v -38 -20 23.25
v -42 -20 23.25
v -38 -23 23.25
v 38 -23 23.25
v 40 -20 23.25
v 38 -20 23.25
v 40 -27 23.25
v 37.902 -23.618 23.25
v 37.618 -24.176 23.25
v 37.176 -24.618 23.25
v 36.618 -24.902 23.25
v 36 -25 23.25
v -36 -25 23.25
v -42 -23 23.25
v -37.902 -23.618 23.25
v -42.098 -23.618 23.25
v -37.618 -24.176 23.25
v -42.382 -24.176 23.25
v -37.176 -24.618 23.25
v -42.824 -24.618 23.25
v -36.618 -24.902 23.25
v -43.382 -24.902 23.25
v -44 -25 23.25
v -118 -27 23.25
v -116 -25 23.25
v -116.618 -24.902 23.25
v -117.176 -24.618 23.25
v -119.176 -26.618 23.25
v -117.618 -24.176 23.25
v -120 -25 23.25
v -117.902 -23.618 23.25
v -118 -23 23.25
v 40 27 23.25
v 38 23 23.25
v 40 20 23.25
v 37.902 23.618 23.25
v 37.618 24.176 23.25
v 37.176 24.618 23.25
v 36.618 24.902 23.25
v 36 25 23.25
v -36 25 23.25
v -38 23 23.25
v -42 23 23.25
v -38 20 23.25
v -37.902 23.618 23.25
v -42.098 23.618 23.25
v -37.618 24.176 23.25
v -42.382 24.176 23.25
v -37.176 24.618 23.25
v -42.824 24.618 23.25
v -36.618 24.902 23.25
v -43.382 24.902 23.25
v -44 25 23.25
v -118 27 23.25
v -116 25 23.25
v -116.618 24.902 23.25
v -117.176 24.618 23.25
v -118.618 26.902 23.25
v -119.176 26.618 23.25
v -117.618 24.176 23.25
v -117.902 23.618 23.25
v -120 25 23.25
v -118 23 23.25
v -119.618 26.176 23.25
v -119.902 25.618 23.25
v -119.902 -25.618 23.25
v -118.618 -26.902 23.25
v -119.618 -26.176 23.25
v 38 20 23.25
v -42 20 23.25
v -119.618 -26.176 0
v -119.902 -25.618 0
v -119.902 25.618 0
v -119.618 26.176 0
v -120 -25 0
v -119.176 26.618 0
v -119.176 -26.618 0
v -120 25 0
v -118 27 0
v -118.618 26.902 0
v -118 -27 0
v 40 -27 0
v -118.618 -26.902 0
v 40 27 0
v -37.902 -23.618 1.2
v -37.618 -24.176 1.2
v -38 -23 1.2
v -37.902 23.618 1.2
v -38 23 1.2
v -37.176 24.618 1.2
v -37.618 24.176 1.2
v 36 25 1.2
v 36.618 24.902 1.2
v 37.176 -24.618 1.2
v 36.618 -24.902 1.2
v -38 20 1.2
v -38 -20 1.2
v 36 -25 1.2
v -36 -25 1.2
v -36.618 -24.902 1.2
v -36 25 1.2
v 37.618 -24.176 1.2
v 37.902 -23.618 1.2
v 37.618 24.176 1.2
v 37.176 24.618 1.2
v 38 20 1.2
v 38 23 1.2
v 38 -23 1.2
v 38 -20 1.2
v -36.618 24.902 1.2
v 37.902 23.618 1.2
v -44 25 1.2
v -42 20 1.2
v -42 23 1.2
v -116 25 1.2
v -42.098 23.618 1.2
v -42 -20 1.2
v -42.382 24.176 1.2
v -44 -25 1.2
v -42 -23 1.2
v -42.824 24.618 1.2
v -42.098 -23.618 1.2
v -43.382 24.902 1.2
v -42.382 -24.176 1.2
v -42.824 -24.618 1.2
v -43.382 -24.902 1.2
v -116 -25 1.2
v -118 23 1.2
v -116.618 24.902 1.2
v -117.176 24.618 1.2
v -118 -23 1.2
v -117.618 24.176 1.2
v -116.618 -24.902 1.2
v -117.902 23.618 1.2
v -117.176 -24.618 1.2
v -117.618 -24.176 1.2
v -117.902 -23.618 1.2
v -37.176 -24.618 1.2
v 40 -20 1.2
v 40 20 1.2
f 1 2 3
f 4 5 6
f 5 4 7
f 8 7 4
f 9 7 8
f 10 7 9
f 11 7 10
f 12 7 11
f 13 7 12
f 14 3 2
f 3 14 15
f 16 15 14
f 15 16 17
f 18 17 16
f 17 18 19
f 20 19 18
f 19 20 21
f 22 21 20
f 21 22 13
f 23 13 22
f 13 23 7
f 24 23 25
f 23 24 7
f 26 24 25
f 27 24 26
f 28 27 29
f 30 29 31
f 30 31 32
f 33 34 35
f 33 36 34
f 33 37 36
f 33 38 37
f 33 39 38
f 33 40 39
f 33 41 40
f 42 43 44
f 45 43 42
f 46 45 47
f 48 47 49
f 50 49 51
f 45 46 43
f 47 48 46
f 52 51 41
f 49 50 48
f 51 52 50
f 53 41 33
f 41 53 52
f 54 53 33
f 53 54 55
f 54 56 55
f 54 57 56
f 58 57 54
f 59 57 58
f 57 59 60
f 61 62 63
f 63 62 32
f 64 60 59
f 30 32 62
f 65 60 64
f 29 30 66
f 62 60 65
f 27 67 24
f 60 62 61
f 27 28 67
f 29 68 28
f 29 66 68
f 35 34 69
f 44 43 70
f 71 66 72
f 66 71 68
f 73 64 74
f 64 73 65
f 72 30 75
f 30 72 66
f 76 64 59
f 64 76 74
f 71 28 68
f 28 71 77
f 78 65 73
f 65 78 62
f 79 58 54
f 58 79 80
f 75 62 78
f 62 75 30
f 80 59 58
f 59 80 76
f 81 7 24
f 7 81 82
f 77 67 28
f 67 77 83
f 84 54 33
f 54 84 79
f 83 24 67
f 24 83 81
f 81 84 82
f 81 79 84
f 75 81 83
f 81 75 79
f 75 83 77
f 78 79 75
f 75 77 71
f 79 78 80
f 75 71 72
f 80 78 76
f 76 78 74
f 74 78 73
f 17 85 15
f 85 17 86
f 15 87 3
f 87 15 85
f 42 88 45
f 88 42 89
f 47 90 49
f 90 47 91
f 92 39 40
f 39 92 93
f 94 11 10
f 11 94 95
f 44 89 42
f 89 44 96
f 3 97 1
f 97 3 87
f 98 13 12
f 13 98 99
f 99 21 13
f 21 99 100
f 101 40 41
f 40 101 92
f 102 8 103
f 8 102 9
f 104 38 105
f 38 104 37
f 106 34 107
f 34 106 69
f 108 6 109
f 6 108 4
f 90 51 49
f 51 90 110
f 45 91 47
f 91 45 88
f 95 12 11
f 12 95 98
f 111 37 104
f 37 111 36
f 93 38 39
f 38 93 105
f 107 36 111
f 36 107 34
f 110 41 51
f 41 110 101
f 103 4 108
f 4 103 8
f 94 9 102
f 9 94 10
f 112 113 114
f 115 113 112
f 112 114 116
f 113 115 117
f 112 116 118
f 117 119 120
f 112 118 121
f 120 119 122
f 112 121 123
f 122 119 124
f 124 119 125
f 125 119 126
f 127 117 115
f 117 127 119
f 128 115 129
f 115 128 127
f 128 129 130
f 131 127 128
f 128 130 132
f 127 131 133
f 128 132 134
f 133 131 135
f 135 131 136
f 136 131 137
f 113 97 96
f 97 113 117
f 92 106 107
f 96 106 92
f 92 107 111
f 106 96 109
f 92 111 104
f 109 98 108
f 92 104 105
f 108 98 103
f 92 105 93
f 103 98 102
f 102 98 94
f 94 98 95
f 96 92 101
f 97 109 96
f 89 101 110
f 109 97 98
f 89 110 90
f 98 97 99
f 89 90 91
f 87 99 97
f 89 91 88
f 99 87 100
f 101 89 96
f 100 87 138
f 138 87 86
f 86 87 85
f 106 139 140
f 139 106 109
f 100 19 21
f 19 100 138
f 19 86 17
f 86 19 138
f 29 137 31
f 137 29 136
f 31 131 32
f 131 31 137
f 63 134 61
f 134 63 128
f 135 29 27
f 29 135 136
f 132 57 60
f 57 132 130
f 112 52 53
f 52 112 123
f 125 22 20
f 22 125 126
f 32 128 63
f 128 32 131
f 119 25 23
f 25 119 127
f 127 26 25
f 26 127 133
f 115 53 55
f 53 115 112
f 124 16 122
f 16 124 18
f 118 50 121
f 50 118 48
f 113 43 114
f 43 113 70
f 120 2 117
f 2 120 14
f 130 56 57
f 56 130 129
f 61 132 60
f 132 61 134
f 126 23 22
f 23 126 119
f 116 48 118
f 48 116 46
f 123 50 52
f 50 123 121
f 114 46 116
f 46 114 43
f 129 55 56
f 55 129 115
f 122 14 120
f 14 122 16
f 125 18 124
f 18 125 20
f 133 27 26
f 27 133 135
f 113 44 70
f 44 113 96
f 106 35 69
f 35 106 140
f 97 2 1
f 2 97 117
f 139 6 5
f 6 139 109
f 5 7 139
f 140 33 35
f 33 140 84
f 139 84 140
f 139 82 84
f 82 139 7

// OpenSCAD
// file: bintools.scad
/* bintools.scad
 *
 * Copyright (C) Robert B. Ross, 2016
 *
 * This software is released under the Creative Commons
 * Attribution-ShareAlike 4.0 International Public License.
 */

// Harbor Frieght Medium
// 46.5mm tall
// 48.6mm tall with legs
// 80mm wide, 77 bottom
// 54mm length, 52 bottom

/* harborFreightMediumFullHt(locations)
 *
 * locations -- an array of pairs of triples specifying a translation and rotation of the children().
 *              e.g., locations = [[[0,0,0], [0,0,0]],
 *                                 [[5.5, 21.3,0], [0,0,0]],
 *                                 [[-5.5, -21.3, 0],[0,0,0]]];
 *
 * outlineScale -- scaling of the region around the blank. 1.2 is default.
 *
 * Dimensions (from Kariko83)
 *   46.5mm tall
 *   48.6mm tall with legs
 *   80mm wide, 77mm bottom
 *   54mm length, 52mm bottom
 */
module harborFreightMediumFullHt(locations=[]) {
   solidBottomBox(xDim=54,yDim=80,ht=46.5,locations=locations) children();
}

/* harborFreightLargeHalfHt(locations)
 *
 * See above for description of locations variable
 *
 * Dimensions (from Kariko83)
 *   46.5mm tall
 *   48.6mm tall with legs
 *   109.25mm wide
 *   80mm length
 */
module harborFreightLargeHalfHt(locations=[]) {
   solidBottomBox(xDim=80,yDim=109.25,ht=46.5/2,locations=locations) children();
}

/* solidBottomBox() -- generate a rounded, solid-bottom box with children used to generate slots for holding ships.
 *
 * locations -- an array of pairs of triples specifying a translation and rotation of the children().
 *              e.g., locations = [[[0,0,0], [0,0,0]],
 *                                 [[5.5, 21.3,0], [0,0,0]],
 *                                 [[-5.5, -21.3, 0],[0,0,0]]];
 *
 * outlineScale -- scaling of the region around the blank. 1.2 is default.
 *
 * NOTE: Assumes that children are "upside down" (i.e., the XY plane is meant to be top of box) so that
 *       models can drop in "bottom up".
 */
module solidBottomBox(xDim=10,xDim=10,ht=10,locations=[],outlineScale=1.2) {
   offsetFromTop = 0.1; /* amount of space to move the outline from the top of the form; helps keep model clean */

   /* flip right-side up and place on XY plane */
   translate([0,0,ht]) rotate([180,0,0]) {
      /* parallel-sided box, complete bottom */
      roundShapedBox(xDimTop=xDim, yDimTop=yDim, xDimBottom=xDim,
                     yDimBottom=yDim, ht=ht, wallThick=1.6);
      translate([0,0,ht-1.2]) roundBoxBottom(xDim=xDim,yDim=yDim,ht=1.2);

      /* spaces to hold ships */
      difference() {
         union() {
            /* base form */
            for (loc = locations) {
                translate([0,0,offsetFromTop]) translate(loc[0]) rotate(loc[1])
                   blankOutline(height=ht-offsetFromTop, outlineScale=outlineScale) children();
            }
         }
         union() {
            /* what will be differenced out */
            for (loc = locations) {
                translate(loc[0]) rotate(loc[1]) children();
            }
         }
      }
   }
}


/* blankCutout() - extrudes an outline of children() to a given height
 *                 and then difference()s out the children(), leaving
 *                 only the outline.
 */
module blankCutout(height=48.6, epsilon=0.1, outlineScale=1.4) {
   difference() {
      translate([0,0,epsilon]) linear_extrude(height=height-epsilon)
         outline(outlineScale=outlineScale) projection(cut=false) children();
      children();
   }
}

/* blankOutline() - extrudes an outline (enclosing form) of children()
 *                  to a given height.
 *
 * Notes: Intended to allow for taking a form (the "blank") and create a
 *        supporting shape around it.
 */
module blankOutline(height=48.6) {
   linear_extrude(height=height) outline() projection(cut=false) children();
}


/* outline() - generates an outline of an object
 *
 * Note: This is intended to be used on a 2D shape, such as one created
 *       using the projection() operator.
 */
module outline(outlineIterations = 30,outlineScale=1.4) {
   for (i=[0:outlineIterations]) {
      translate([outlineScale*cos(360*i/outlineIterations),
                 outlineScale*sin(360*i/outlineIterations),0]) children();
   }
}

/* roundBox() - rounded corner box
 */
module roundBox(cornerRad=2,xDim=10,yDim=10,ht=10,wallThick=1.2) {
   linear_extrude(height=ht) difference() {
      hull() {
         translate([xDim/2-cornerRad,
                    yDim/2-cornerRad,0]) circle(r=cornerRad);
         translate([-1*xDim/2+cornerRad,
                    yDim/2-cornerRad,0]) circle(r=cornerRad);
         translate([xDim/2-cornerRad,
                    -1*yDim/2+cornerRad,0]) circle(r=cornerRad);
         translate([-1*xDim/2+cornerRad,
                    -1*yDim/2+cornerRad,0]) circle(r=cornerRad);
      }
      hull() {
         translate([xDim/2-cornerRad-wallThick,
                    yDim/2-cornerRad-wallThick,0]) circle(r=cornerRad);
         translate([-1*xDim/2+cornerRad+wallThick,
                    yDim/2-cornerRad-wallThick,0]) circle(r=cornerRad);
         translate([xDim/2-cornerRad-wallThick,
                    -1*yDim/2+cornerRad+wallThick,0]) circle(r=cornerRad);
         translate([-1*xDim/2+cornerRad+wallThick,
                    -1*yDim/2+cornerRad+wallThick,0]) circle(r=cornerRad);
      }
   }
}

/* roundBoxBottom() - rounded corner box bottom
 */
module roundBoxBottom(cornerRad=2,xDim=10,yDim=10,ht=10) {
   linear_extrude(height=ht) hull() {
      translate([xDim/2-cornerRad,
                 yDim/2-cornerRad,0]) circle(r=cornerRad);
      translate([-1*xDim/2+cornerRad,
                 yDim/2-cornerRad,0]) circle(r=cornerRad);
      translate([xDim/2-cornerRad,
                 -1*yDim/2+cornerRad,0]) circle(r=cornerRad);
      translate([-1*xDim/2+cornerRad,
                 -1*yDim/2+cornerRad,0]) circle(r=cornerRad);
   }
}

/* roundShapedBox() - rounded corner box that tapers
 *
 * Note: In typical use for these bins, the *bottom* of this box ends up
 *       being the top of the bin.
 */
module roundShapedBox(cornerRad=2,
                      xDimTop=54,
                      yDimTop=80,
                      xDimBottom=52,
                      yDimBottom=77,
                      ht=46.5/2,
                      wallThick=2)
{
   linear_extrude(height=ht,
                  scale=[xDimTop/xDimBottom,yDimTop/yDimBottom])
   difference() {
      hull() {
         translate([xDimBottom/2-cornerRad,
                    yDimBottom/2-cornerRad,0]) circle(r=cornerRad);
         translate([-1*xDimBottom/2+cornerRad,
                    yDimBottom/2-cornerRad,0]) circle(r=cornerRad);
         translate([xDimBottom/2-cornerRad,
                    -1*yDimBottom/2+cornerRad,0]) circle(r=cornerRad);
         translate([-1*xDimBottom/2+cornerRad,
                    -1*yDimBottom/2+cornerRad,0]) circle(r=cornerRad);
      }
      hull() {
         translate([xDimBottom/2-cornerRad-wallThick,
                    yDimBottom/2-cornerRad-wallThick,0]) circle(r=cornerRad);
         translate([-1*xDimBottom/2+cornerRad+wallThick,
                    yDimBottom/2-cornerRad-wallThick,0]) circle(r=cornerRad);
         translate([xDimBottom/2-cornerRad-wallThick,
                    -1*yDimBottom/2+cornerRad+wallThick,0]) circle(r=cornerRad);
         translate([-1*xDimBottom/2+cornerRad+wallThick,
                    -1*yDimBottom/2+cornerRad+wallThick,0]) circle(r=cornerRad);
      }
   }
}

/*
 * Local variables:
 *  mode: C
 *  c-indent-level: 4
 *  c-basic-offset: 4
 * End:
 *
 * vim: ts=8 sts=4 sw=4 expandtab
 */
// main file
/* template-bin.scad
 *
 * Copyright (C) Robert B. Ross, 2016
 *
 * This software is released under the Creative Commons
 * Attribution-ShareAlike 4.0 International Public License.
 */

$fn=20;

include <./bintools.scad>

/* Harbor Frieght Medium
 * 46.5mm tall
 * 48.6mm tall with legs
 * 80mm wide, 77 bottom
 * 54mm length, 52 bottom
 */

leftSide();
// translate([5,0,0]) rightSide();

module rightSide() {
   intersection() {
      templateBin();
      translate([40,-40,-0.5]) cube([200,80,50]);
   }
}
module leftSide() {
   difference() {
      templateBin();
      translate([40,-40,-0.5]) cube([200,80,50]);
   }
}

/* Note: abusing roundBoxBottom() to make entire box shape */
module templateBin() {
   difference() {
      union() {
         roundBoxBottom(xDim=240, yDim=54, ht=46.5/2);
      }
      translate([0,0,1.2]) roundBoxBottom(xDim=76, yDim=50, ht=46.5/2);
      translate([80,0,1.2]) roundBoxBottom(xDim=76, yDim=50, ht=46.5/2);
      translate([-80,0,1.2]) roundBoxBottom(xDim=76, yDim=50, ht=46.5/2);
      translate([0,0,24+1.2]) cube([200,40,48],center=true);
   }
}

/*
 * Local variables:
 *  mode: C
 *  c-indent-level: 4
 *  c-basic-offset: 4
 * End:
 *
 * vim: ts=8 sts=4 sw=4 expandtab
 */
